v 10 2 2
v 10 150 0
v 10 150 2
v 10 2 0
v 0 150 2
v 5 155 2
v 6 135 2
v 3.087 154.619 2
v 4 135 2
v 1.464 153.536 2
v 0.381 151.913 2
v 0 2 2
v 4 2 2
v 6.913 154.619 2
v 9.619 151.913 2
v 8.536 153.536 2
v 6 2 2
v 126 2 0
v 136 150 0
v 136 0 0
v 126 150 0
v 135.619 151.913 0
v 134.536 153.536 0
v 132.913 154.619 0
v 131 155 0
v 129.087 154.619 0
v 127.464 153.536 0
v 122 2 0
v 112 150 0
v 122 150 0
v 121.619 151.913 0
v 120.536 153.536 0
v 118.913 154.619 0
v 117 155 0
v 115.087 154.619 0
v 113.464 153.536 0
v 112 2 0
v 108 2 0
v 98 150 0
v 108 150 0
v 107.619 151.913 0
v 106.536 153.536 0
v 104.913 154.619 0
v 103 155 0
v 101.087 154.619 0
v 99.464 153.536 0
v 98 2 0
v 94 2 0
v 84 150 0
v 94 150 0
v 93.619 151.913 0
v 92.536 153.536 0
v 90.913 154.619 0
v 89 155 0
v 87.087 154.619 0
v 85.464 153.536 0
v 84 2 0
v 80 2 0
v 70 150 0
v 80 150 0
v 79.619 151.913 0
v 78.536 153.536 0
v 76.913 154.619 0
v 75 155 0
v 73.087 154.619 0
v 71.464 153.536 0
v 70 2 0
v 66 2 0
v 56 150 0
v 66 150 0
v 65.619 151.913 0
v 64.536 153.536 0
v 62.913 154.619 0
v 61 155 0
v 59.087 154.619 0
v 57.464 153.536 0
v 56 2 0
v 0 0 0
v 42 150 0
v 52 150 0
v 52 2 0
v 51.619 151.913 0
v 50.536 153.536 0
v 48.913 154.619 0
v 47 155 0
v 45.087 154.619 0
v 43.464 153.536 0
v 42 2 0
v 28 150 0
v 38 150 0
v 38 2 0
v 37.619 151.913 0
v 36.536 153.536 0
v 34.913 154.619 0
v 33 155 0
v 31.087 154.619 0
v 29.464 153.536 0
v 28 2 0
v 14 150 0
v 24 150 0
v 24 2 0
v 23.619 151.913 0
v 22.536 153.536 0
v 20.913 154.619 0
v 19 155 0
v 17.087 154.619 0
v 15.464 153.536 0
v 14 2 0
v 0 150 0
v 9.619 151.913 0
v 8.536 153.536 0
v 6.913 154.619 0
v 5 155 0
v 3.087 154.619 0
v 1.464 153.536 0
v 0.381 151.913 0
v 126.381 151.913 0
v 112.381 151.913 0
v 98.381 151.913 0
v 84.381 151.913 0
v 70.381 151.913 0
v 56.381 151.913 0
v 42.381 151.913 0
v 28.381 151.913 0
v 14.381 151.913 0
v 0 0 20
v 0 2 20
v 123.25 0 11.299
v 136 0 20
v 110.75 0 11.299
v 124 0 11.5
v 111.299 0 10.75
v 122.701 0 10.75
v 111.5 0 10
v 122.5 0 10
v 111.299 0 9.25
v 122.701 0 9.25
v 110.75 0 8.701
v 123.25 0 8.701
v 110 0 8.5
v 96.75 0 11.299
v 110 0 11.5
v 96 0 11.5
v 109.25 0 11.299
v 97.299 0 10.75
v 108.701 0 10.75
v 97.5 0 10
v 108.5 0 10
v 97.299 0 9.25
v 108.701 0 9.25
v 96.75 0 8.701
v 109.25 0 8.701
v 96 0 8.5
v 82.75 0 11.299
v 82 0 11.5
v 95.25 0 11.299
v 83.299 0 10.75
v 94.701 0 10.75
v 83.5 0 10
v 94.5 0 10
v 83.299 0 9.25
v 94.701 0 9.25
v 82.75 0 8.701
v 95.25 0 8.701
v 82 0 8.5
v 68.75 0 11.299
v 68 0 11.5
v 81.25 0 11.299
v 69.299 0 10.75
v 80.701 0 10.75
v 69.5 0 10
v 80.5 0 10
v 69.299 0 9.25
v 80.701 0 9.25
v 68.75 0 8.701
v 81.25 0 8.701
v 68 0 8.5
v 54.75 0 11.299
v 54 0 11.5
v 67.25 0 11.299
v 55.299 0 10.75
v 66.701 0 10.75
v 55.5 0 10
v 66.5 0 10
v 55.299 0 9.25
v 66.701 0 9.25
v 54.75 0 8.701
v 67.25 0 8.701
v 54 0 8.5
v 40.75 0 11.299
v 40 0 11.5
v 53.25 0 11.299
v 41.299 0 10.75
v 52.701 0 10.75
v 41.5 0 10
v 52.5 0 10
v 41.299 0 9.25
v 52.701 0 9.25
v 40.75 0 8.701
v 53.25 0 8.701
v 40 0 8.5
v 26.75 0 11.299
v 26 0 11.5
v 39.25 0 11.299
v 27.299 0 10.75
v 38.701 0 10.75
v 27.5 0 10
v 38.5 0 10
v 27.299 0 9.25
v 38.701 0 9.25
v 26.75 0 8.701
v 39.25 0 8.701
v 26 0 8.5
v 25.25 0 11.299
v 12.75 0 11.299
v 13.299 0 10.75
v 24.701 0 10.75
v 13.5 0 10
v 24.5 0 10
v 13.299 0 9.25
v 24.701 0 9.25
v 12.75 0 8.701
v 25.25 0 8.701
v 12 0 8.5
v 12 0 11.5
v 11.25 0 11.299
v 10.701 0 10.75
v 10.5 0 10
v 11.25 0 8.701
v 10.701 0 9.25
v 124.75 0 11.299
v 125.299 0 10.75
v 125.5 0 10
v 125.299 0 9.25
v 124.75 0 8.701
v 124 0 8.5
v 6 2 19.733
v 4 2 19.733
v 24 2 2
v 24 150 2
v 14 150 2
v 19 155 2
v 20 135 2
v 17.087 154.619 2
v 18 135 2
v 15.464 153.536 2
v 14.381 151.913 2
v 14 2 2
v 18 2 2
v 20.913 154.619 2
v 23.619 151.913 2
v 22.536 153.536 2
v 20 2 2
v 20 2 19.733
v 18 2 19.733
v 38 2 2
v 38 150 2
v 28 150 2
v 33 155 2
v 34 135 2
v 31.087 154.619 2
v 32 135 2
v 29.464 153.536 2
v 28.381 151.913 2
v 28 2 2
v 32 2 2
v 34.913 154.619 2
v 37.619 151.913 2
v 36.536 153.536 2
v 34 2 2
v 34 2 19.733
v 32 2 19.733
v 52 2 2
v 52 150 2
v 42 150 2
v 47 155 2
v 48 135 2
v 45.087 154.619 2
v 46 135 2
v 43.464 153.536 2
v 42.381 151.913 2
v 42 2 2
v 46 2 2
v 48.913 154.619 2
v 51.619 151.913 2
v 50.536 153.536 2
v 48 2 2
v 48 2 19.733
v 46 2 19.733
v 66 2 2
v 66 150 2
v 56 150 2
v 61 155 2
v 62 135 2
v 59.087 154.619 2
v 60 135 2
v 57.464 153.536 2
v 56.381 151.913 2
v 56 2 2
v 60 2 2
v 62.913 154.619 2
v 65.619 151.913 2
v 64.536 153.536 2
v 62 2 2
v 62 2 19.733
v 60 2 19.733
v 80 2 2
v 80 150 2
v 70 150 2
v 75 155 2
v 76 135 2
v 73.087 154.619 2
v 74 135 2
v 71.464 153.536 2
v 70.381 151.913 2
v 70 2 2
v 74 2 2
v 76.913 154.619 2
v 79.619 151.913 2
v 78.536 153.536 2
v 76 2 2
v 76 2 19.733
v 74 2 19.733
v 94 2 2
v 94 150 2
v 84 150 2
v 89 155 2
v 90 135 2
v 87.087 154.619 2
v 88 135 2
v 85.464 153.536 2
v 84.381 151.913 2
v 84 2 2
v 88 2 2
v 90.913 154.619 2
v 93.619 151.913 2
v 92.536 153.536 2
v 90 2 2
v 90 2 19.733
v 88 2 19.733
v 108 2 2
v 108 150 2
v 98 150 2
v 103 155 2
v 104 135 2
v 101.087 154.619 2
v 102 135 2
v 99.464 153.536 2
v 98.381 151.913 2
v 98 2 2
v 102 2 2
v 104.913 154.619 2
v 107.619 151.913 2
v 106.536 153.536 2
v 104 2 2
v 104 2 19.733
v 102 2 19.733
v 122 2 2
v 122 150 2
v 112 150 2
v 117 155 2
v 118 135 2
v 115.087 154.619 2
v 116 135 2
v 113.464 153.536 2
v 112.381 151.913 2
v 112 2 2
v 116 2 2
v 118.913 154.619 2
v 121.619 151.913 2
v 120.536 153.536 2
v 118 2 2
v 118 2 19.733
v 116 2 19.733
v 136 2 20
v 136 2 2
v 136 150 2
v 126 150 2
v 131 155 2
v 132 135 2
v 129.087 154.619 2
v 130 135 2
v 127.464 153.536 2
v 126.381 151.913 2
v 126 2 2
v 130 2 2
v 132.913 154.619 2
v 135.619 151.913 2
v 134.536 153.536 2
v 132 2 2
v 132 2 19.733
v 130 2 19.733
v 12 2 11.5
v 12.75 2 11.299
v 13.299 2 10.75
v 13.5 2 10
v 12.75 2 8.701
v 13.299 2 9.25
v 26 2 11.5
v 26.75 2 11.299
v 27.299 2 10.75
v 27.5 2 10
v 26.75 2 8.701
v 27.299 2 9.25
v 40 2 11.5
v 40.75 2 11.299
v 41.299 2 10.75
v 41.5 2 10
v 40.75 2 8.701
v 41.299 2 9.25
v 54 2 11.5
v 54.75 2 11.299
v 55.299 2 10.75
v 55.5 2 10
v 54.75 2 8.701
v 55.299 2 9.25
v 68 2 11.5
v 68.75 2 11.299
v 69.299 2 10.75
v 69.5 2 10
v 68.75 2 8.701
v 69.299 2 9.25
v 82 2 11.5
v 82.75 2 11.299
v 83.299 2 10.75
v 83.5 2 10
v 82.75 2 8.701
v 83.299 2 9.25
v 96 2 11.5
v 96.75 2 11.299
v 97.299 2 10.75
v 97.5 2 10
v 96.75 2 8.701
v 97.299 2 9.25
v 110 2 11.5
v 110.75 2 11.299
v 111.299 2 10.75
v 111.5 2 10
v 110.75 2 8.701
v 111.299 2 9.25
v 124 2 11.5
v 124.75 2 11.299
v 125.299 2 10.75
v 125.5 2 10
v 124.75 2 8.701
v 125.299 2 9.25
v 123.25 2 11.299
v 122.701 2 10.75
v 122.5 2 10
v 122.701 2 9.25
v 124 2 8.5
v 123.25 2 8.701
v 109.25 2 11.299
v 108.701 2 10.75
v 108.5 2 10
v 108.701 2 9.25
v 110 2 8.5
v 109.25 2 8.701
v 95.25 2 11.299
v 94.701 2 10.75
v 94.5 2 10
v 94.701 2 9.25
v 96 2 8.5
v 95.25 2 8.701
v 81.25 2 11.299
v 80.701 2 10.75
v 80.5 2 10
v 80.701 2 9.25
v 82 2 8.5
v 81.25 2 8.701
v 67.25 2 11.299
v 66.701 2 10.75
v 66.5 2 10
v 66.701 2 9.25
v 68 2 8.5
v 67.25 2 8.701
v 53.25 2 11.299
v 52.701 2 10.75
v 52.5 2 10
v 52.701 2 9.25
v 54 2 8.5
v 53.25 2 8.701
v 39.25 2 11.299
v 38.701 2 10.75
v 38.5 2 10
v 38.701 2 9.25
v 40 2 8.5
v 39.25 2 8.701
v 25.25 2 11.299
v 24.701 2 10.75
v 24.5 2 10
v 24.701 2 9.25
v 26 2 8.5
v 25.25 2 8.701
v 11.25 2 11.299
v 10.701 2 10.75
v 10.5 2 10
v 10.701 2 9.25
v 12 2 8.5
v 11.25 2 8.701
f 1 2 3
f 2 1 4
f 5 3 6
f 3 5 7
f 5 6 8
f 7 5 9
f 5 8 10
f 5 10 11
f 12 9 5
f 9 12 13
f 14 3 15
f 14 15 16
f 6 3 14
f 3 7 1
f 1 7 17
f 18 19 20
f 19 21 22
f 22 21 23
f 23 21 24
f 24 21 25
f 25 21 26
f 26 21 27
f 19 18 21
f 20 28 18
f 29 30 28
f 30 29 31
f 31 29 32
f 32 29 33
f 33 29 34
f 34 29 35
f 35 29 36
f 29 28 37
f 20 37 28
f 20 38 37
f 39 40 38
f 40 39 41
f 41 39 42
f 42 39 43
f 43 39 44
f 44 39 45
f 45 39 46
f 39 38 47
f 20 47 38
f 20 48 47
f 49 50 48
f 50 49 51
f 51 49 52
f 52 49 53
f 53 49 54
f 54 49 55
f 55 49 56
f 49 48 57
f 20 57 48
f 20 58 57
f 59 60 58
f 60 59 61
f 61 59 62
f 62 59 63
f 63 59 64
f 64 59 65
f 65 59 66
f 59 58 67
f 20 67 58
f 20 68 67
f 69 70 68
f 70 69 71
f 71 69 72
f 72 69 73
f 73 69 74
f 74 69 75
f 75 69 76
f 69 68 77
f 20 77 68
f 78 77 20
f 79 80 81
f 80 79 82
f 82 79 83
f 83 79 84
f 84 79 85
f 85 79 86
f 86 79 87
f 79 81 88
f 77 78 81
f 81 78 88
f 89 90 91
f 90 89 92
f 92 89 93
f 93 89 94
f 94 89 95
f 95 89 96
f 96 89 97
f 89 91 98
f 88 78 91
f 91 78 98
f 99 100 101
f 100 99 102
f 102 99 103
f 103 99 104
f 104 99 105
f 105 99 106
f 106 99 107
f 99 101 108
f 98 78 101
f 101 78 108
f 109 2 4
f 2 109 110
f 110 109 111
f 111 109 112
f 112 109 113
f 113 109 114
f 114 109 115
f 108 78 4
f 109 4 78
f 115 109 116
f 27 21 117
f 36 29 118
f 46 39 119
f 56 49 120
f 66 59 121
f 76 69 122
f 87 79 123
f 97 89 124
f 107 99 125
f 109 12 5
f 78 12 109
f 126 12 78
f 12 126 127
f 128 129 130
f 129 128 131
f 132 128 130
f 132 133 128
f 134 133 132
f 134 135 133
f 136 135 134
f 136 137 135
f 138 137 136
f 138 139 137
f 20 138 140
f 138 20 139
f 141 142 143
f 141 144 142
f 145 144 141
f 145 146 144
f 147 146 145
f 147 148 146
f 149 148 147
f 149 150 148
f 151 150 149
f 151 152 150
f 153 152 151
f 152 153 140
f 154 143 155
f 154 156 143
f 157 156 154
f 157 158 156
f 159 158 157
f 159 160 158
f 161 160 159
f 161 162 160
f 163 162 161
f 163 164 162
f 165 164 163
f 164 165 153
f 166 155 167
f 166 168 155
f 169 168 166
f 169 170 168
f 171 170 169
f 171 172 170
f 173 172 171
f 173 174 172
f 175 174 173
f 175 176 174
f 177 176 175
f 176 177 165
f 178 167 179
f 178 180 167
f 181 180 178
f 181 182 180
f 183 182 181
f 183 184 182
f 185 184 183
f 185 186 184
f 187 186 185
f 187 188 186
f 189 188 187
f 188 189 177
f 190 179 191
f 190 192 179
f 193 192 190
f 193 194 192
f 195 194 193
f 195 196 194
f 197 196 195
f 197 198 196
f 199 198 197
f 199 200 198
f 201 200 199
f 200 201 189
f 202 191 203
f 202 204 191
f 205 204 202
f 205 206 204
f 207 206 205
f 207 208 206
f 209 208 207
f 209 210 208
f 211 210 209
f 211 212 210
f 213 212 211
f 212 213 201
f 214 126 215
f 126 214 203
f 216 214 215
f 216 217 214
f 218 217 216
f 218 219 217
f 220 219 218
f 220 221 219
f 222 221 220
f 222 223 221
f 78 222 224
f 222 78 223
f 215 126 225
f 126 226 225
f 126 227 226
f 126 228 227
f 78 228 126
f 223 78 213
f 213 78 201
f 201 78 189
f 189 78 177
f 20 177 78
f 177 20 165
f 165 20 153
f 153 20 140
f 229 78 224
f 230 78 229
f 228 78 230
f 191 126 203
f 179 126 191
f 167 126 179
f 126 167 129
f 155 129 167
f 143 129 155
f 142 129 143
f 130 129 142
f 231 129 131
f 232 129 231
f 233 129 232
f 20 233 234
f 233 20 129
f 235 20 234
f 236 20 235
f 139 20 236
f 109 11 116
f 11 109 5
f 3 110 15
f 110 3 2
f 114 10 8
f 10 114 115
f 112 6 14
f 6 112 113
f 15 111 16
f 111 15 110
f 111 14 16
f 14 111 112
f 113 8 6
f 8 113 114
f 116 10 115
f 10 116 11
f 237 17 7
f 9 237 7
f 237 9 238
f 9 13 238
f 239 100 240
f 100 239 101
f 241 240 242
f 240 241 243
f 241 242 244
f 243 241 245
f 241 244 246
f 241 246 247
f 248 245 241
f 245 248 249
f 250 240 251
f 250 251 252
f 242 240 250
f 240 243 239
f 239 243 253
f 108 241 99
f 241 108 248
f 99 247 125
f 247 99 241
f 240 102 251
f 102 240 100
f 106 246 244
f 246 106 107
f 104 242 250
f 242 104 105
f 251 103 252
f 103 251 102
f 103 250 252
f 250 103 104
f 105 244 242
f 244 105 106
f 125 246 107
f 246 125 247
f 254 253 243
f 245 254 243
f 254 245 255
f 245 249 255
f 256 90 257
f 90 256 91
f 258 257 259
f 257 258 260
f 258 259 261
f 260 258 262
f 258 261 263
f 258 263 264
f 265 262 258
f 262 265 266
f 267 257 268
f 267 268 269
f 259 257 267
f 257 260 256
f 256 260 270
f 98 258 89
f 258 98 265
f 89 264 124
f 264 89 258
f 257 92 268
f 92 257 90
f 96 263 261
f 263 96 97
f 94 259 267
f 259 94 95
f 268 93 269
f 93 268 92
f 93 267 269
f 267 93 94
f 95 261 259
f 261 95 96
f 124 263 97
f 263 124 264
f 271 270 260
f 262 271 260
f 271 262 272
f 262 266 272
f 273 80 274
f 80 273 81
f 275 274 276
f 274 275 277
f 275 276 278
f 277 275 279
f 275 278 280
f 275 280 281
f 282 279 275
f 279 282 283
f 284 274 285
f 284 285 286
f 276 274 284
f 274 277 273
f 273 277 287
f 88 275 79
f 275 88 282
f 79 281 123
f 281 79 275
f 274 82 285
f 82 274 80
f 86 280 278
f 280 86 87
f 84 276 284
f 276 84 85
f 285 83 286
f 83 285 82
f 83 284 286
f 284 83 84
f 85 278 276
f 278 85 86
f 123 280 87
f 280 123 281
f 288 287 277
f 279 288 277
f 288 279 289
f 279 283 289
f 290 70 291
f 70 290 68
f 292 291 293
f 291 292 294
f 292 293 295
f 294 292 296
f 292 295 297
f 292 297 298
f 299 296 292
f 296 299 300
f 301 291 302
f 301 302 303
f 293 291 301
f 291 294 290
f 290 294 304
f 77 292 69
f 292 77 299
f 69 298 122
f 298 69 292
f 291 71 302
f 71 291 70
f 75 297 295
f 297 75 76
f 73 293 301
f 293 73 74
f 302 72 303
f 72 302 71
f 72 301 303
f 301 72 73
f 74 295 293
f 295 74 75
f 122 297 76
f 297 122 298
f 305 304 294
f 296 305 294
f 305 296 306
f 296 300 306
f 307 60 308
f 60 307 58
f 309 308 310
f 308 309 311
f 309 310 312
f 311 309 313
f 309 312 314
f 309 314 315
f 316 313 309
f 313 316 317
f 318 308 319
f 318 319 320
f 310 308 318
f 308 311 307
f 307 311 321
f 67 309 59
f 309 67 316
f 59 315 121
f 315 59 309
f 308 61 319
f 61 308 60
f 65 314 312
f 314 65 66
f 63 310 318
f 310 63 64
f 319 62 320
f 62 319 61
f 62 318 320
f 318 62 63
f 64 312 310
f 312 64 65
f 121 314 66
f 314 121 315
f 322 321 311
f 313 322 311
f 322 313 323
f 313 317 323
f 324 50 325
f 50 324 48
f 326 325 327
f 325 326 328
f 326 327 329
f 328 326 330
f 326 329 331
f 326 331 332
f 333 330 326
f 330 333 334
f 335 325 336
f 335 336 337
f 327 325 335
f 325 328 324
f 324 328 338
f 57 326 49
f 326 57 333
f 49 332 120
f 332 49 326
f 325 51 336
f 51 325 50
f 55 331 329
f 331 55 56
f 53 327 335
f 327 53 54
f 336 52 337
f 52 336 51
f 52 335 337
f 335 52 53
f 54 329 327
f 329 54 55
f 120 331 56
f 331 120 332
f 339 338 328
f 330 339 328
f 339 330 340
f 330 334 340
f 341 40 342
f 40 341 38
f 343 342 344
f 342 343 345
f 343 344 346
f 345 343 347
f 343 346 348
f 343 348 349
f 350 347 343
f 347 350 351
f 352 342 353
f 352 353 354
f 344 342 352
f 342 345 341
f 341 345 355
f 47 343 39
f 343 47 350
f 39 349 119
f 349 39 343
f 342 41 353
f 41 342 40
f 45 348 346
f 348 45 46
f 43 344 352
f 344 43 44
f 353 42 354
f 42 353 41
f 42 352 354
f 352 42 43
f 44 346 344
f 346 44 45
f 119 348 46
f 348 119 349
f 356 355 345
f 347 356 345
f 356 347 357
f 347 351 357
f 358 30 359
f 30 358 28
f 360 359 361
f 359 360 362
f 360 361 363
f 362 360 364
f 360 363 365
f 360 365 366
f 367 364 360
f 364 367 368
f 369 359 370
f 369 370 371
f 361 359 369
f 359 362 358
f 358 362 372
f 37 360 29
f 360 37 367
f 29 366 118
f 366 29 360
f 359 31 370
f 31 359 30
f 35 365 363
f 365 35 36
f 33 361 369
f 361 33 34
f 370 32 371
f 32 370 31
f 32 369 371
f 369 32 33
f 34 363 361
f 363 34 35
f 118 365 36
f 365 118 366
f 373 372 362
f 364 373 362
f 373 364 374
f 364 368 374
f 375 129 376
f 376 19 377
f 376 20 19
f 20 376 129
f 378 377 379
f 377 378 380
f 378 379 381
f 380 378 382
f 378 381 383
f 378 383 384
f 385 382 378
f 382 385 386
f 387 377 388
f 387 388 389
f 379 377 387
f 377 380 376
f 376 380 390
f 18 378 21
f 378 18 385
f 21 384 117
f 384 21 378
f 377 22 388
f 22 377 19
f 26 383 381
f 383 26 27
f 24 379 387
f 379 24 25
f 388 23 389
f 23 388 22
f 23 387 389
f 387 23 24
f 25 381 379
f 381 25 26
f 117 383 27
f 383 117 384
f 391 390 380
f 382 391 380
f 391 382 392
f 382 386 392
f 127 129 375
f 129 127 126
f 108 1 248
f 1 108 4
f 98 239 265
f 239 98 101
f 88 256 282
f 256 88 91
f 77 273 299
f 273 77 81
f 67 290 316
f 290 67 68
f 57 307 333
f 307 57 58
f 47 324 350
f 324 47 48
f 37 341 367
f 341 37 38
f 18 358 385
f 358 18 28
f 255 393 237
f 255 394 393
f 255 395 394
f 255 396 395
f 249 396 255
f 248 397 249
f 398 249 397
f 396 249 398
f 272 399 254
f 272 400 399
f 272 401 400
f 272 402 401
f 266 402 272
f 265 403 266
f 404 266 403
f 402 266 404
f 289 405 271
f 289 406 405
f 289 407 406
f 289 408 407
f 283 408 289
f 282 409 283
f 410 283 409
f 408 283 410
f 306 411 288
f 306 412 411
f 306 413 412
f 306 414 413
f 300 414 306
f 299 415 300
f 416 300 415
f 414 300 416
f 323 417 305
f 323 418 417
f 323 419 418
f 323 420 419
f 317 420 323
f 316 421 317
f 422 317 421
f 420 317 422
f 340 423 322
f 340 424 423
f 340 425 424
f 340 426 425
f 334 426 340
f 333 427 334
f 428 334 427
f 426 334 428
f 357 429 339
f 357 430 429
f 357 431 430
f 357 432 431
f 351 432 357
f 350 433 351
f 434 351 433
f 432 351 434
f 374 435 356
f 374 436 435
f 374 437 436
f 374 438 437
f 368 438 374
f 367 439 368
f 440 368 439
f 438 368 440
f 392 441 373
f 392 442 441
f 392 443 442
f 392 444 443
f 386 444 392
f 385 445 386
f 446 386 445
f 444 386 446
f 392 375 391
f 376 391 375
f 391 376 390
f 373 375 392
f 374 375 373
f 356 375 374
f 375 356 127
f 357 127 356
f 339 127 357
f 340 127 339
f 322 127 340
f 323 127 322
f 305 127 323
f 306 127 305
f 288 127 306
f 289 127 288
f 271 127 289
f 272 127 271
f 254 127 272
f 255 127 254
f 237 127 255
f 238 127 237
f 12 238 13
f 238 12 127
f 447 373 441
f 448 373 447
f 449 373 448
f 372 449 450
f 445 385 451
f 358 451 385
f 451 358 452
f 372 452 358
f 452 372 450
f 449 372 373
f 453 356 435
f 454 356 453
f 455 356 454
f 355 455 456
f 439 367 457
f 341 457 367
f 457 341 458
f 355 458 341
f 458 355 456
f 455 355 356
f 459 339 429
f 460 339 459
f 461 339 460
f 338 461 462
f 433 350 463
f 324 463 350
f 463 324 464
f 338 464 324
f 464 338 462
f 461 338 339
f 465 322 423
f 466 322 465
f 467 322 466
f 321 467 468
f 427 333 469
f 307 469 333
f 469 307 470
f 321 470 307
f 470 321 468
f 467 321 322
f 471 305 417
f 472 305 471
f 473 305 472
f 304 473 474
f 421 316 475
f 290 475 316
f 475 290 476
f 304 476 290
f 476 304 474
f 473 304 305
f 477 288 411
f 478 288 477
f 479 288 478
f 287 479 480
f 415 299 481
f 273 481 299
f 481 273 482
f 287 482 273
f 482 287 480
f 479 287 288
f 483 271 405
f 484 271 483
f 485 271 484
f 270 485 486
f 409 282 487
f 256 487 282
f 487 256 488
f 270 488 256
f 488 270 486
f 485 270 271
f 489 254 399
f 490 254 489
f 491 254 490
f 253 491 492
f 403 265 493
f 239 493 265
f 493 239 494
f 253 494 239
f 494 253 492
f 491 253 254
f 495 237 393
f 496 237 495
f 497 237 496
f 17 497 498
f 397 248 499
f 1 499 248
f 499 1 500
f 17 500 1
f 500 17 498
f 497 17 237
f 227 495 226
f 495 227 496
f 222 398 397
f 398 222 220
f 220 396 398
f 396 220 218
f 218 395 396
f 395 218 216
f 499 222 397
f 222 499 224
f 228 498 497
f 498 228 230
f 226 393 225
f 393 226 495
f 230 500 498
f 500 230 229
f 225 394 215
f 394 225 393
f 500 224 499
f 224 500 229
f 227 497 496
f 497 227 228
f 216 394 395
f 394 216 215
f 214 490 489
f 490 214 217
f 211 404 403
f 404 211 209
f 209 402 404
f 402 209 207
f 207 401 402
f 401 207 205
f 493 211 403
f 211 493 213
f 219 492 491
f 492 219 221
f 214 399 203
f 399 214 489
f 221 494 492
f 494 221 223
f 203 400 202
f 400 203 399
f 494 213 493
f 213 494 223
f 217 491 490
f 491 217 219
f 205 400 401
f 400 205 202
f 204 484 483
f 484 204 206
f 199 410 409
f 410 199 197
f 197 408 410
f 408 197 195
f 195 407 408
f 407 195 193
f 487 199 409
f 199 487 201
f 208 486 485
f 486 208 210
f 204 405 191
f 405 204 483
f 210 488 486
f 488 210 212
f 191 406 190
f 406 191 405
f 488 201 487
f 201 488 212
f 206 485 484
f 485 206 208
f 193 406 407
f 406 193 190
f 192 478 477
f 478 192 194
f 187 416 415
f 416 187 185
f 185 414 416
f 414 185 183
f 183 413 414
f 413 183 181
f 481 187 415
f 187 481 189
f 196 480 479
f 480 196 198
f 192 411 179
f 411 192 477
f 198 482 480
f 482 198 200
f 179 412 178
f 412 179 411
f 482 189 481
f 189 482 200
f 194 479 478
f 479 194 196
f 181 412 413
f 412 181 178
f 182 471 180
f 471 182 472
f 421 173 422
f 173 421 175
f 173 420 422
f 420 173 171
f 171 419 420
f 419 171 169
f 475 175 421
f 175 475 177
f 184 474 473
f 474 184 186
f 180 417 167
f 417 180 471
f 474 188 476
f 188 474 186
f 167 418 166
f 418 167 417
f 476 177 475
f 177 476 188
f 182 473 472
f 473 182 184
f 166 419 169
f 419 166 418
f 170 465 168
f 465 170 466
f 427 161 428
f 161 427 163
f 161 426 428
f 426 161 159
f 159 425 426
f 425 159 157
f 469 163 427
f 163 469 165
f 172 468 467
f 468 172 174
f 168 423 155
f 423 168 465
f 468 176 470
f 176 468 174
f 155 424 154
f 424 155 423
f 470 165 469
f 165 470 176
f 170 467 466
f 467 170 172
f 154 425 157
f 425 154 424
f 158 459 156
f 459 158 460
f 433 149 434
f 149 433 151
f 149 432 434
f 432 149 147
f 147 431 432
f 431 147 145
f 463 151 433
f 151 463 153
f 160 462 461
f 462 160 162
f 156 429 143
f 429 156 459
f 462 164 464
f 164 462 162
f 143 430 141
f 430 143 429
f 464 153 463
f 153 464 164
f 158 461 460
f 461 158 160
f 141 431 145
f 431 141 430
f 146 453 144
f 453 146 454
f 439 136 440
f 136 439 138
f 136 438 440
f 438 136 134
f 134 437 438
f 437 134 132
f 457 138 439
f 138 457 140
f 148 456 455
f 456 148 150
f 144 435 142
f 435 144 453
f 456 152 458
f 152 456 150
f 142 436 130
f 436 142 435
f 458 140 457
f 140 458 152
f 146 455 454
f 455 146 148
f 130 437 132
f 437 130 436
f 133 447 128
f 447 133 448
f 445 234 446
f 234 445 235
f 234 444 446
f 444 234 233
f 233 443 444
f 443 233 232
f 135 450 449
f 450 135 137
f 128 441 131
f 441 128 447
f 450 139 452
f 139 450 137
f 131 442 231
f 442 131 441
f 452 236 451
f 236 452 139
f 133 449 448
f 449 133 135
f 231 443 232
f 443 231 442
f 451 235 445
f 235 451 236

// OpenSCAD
//
//  This defines a comb for storing cables of various sizes.
//
//
//  Cable sizes
//
banana_size = 4;
cat5_size = 5;
//
//  Module for the cable comb.
//    size - the diameter of the cable plus a little extra
//    number - the number of fingers in the comb
//
finger_width = 10;
module bbs_finger()
{
  cube([finger_width, 150, 2]);
  translate([finger_width/2, 150, 0]) cylinder(r=finger_width/2, h=2);
  translate([finger_width/2 + 1, 0, 0]) rotate([0, -90, 0]) linear_extrude(height=2)
    polygon([[0, 0], [0, 150], [20, 0]]);
}

module bbs_cable_comb(size, number)
{
  difference()
  {
    union()
    {
      for(a = [0:(number - 1)])
      {
        x_offset = a*(finger_width + size);
        translate([x_offset, 0, 0]) bbs_finger();
      }
      cube([number*(finger_width + size) - size, 2, 20]);
    }
    union()
    {
      for(a = [1:(number - 1)])
      {
        translate([a*(finger_width + size) - size/2, -0.1, 10]) rotate([-90, 0, 0])
          cylinder(r=1.5, h=3, $fn=12);
      }
    }
  }
}

bbs_cable_comb(banana_size, 10);
